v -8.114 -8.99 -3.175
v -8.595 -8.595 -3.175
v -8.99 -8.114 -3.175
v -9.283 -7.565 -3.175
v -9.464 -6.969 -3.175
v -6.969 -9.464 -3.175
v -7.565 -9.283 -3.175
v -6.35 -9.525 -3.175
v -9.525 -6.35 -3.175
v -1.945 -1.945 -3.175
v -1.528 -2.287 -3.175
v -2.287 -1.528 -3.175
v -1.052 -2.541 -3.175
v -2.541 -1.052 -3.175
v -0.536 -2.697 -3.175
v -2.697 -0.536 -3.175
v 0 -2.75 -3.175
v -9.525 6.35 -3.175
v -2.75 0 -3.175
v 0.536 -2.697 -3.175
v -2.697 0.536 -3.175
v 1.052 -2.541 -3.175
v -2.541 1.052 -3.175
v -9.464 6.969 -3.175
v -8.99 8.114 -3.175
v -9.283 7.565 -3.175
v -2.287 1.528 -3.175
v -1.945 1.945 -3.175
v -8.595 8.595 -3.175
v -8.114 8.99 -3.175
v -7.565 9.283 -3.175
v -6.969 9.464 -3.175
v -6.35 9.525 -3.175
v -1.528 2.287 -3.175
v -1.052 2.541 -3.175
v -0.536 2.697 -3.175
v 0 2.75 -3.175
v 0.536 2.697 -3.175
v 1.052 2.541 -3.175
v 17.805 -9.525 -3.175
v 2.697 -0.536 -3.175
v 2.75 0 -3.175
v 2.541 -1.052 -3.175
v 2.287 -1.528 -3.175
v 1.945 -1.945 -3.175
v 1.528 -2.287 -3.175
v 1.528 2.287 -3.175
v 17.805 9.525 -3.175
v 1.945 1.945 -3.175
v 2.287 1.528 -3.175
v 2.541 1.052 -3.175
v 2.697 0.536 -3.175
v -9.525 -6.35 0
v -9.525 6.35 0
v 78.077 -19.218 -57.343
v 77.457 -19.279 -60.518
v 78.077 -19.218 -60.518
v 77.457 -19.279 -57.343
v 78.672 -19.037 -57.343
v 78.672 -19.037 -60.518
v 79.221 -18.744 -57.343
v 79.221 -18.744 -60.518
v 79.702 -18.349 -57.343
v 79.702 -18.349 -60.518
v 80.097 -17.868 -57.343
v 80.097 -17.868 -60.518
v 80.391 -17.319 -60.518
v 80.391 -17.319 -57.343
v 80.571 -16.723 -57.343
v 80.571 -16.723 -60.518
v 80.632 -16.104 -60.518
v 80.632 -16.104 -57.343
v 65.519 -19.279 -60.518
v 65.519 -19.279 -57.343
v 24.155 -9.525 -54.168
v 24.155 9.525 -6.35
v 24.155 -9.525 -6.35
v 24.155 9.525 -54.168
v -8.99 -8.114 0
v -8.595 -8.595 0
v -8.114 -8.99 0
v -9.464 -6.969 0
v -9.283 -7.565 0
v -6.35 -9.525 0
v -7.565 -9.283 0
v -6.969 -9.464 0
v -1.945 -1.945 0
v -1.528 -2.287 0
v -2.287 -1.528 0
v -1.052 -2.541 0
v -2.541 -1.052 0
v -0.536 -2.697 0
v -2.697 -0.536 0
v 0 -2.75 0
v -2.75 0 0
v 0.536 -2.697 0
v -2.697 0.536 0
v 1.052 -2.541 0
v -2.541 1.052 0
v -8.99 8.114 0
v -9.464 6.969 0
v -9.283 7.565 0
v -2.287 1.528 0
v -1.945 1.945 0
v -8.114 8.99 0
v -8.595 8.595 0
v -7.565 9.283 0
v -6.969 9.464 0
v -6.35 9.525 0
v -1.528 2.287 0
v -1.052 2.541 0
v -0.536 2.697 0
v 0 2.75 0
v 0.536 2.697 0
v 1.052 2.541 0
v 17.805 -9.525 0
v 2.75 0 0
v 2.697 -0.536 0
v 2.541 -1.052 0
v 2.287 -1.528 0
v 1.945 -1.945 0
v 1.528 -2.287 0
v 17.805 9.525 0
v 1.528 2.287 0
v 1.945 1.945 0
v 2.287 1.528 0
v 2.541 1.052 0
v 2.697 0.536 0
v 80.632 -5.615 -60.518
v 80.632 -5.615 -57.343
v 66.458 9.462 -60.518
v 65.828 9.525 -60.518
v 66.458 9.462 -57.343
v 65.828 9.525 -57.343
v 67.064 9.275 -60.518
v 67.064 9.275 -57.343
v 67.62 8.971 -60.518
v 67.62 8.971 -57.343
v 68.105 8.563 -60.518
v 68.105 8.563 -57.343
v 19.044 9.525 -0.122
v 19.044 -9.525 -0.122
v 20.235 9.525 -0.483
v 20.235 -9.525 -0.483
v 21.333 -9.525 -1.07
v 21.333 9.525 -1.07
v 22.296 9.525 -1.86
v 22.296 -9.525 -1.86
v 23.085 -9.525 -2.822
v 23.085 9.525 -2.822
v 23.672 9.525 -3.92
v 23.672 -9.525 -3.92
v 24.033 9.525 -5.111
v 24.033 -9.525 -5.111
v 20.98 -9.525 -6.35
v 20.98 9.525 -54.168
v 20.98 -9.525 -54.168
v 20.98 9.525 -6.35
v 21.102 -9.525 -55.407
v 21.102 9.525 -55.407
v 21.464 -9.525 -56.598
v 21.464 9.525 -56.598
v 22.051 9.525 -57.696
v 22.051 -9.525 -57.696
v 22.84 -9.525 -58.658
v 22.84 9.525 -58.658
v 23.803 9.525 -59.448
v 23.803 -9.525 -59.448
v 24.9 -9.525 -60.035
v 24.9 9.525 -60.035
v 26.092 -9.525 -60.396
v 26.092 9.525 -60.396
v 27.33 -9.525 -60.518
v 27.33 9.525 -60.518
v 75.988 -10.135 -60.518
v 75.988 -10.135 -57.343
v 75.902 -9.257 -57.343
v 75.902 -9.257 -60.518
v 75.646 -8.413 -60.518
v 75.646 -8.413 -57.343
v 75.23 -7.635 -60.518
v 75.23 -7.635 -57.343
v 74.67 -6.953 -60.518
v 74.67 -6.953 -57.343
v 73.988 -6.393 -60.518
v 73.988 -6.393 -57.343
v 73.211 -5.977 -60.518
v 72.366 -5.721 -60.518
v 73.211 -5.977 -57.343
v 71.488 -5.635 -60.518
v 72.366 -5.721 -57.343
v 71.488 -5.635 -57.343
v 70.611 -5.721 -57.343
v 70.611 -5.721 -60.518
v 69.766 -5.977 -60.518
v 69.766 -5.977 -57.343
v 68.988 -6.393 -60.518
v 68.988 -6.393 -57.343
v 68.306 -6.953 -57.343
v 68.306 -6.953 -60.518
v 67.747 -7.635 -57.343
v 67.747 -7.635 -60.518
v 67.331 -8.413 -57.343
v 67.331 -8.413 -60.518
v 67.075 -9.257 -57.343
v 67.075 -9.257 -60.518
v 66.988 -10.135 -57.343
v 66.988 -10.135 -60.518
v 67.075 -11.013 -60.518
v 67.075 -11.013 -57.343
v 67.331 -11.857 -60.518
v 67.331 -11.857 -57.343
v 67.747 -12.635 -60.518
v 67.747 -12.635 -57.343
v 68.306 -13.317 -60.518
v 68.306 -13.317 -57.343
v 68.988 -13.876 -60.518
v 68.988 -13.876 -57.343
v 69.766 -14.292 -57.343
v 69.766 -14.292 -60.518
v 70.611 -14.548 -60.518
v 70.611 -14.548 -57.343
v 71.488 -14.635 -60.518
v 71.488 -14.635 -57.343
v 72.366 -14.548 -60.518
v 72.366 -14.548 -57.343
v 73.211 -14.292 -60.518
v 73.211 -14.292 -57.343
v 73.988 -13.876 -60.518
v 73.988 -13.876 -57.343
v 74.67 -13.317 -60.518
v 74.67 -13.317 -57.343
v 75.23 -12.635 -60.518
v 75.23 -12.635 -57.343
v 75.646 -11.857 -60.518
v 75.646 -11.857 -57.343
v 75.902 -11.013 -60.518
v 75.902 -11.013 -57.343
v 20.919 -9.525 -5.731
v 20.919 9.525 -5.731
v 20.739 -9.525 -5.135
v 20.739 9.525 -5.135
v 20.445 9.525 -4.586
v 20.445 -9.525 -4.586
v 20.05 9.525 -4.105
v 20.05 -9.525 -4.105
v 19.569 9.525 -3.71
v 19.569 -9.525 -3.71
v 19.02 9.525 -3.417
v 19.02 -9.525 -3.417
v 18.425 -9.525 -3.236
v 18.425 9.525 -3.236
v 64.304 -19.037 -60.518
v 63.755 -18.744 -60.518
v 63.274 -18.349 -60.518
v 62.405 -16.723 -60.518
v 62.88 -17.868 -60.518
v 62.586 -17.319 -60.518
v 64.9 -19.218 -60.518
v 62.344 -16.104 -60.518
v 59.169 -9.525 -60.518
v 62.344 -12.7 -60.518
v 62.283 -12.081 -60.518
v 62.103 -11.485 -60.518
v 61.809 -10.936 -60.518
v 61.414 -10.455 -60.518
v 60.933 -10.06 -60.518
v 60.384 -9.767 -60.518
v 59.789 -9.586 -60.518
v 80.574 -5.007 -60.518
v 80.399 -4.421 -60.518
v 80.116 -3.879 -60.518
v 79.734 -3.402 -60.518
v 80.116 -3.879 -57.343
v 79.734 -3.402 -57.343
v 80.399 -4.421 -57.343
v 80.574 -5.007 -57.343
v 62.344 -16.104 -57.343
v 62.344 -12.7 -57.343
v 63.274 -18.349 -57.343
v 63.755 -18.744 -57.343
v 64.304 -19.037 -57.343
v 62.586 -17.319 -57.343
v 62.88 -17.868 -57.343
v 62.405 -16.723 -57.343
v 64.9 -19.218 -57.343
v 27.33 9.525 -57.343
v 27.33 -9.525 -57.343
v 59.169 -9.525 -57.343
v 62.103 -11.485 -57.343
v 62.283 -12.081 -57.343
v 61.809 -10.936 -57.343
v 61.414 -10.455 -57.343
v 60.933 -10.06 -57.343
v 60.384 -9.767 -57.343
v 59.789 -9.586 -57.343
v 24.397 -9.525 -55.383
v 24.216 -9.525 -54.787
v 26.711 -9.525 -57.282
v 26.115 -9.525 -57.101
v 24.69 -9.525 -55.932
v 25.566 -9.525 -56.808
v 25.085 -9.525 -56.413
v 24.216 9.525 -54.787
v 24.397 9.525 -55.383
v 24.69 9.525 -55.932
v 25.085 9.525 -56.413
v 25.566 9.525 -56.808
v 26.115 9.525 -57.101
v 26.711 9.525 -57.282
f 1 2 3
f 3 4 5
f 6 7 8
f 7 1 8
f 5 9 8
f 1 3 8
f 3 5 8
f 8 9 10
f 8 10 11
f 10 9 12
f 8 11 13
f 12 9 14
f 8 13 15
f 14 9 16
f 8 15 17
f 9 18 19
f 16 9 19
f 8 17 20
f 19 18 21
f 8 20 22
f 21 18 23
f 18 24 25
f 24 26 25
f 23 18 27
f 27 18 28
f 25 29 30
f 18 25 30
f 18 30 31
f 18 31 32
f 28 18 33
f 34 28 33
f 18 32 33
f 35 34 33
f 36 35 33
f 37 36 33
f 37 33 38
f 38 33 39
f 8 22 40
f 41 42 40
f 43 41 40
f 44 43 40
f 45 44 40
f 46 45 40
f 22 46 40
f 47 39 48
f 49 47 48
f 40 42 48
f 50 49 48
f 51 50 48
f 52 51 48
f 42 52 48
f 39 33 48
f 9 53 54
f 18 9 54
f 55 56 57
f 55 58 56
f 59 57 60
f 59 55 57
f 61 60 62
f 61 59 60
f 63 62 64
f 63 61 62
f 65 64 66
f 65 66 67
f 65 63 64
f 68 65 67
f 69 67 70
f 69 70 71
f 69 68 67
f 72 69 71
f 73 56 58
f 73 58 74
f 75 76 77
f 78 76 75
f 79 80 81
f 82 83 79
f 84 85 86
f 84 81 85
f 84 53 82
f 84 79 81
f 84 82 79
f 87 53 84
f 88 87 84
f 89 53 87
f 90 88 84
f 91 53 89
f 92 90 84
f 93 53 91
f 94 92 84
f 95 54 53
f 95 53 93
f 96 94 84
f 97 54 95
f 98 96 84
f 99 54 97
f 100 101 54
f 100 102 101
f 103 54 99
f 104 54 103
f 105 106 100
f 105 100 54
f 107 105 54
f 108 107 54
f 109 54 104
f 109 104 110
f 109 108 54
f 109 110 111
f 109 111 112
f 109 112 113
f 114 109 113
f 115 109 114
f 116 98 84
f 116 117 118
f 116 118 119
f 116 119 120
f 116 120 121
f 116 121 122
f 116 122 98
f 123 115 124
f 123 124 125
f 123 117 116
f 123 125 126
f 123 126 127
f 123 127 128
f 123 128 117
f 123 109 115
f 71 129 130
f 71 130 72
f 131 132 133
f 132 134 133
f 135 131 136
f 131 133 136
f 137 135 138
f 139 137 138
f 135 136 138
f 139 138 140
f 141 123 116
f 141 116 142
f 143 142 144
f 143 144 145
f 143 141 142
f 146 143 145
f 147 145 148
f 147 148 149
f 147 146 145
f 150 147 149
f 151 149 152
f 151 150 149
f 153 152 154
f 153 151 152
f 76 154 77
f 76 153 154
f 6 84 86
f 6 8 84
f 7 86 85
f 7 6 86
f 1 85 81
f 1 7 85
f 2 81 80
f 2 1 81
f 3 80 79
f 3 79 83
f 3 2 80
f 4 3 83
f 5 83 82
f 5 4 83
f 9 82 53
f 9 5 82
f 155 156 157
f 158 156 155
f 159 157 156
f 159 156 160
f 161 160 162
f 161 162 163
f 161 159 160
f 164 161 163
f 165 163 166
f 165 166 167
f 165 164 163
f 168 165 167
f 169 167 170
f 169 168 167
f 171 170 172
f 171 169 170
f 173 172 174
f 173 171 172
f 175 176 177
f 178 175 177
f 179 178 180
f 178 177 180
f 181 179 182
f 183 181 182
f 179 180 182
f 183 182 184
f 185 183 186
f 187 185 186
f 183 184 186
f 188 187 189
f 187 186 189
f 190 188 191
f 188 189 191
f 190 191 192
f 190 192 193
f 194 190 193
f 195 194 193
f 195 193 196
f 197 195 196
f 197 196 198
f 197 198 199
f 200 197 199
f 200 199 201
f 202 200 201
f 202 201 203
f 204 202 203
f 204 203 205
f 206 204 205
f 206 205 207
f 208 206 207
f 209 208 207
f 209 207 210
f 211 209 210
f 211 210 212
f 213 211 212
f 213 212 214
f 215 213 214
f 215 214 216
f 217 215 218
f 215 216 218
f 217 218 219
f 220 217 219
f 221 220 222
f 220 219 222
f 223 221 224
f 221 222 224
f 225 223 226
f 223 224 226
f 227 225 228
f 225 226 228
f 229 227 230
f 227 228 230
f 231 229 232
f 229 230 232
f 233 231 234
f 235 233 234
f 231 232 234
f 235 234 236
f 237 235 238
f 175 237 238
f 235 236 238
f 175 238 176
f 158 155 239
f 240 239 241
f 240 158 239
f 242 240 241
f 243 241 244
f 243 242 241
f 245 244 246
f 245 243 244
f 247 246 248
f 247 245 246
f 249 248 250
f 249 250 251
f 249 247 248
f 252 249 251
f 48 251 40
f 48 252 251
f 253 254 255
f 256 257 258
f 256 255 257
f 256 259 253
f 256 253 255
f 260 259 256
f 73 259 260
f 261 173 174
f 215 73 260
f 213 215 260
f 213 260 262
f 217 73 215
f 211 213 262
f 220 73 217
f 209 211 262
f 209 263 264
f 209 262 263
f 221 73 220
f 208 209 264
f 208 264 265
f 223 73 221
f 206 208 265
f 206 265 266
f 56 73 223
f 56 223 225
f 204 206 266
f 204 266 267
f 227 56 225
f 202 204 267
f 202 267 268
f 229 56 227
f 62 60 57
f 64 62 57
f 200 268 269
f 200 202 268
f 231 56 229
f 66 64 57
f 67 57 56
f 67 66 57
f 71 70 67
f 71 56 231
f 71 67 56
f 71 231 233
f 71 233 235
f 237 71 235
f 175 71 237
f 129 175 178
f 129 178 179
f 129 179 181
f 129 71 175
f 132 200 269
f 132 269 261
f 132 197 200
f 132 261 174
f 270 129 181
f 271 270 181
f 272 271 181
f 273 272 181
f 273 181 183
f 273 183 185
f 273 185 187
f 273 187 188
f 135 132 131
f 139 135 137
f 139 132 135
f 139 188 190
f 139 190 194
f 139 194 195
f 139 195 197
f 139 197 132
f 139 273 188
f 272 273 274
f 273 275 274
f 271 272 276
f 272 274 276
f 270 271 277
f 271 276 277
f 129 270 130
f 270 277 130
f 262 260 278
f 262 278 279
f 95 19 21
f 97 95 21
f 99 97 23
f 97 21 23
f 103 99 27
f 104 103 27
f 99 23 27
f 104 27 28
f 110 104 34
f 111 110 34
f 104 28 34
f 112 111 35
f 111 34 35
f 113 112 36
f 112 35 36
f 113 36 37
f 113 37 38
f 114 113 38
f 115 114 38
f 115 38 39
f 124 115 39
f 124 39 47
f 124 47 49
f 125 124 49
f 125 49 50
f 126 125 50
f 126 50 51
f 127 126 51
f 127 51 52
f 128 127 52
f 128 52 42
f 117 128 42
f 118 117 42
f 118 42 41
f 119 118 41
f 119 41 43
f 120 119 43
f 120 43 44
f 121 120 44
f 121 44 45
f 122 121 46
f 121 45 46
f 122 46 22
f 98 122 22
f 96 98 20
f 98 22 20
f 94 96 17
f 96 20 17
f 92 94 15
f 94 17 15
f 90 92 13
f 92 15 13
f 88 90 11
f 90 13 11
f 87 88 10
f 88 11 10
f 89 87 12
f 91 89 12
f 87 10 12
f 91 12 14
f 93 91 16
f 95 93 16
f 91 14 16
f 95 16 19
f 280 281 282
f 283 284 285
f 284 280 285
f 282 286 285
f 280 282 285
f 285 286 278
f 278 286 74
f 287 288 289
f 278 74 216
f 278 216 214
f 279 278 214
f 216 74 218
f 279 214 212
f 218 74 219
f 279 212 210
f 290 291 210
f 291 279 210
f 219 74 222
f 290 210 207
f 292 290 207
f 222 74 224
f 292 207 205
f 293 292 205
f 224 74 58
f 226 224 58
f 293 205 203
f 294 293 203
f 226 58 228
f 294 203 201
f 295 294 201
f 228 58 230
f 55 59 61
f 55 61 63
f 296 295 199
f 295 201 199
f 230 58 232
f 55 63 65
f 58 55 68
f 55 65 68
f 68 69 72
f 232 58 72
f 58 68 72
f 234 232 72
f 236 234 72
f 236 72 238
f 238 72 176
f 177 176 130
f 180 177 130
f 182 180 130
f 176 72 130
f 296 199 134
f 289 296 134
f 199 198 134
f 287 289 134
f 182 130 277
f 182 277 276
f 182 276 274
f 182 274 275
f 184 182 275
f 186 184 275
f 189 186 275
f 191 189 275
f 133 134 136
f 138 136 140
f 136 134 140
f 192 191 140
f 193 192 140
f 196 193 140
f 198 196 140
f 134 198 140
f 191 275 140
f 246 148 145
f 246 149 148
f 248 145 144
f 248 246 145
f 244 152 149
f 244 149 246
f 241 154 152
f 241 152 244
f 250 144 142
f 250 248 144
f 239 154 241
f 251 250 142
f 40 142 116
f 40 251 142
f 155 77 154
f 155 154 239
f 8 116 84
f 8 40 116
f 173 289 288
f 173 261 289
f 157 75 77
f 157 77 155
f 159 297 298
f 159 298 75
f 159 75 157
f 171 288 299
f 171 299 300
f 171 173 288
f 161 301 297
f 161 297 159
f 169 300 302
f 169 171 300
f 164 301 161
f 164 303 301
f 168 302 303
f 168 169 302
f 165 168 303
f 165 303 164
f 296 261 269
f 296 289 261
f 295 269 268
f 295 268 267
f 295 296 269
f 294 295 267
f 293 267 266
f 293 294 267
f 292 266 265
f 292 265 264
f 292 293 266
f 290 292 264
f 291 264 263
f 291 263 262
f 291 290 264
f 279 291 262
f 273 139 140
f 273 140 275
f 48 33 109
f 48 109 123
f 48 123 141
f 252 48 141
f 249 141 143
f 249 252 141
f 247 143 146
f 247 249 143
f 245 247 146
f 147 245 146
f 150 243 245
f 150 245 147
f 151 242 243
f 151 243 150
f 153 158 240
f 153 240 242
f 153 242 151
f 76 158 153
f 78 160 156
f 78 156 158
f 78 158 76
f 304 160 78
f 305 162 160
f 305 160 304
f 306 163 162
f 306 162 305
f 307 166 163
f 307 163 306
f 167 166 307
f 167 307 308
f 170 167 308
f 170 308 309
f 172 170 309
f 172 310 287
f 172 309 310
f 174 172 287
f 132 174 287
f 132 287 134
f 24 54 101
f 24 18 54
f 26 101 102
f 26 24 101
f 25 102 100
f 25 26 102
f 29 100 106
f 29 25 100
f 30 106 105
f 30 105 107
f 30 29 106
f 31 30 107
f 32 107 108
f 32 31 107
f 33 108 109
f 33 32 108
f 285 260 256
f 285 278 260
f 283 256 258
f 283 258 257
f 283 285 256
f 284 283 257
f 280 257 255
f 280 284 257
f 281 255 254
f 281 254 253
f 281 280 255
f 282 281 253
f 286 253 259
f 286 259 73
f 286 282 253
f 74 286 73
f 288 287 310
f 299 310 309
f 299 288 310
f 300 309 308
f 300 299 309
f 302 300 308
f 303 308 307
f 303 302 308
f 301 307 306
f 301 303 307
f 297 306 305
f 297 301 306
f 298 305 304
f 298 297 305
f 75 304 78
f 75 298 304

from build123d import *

# Parameters (mm, degrees)
SKETCH2_W                    = 33.6804
SKETCH2_H                    = 19.05
SKETCH2_R                    = 1.189975692
BASE_FLANGE1_DEPTH           = 3.175
EDGE_FLANGE3_STRIP_W         = 19.05
EDGE_FLANGE3_STRIP_H         = 3.175
EDGE_FLANGE3_STRIP_CUT_DEPTH = 19.05
EDGE_FLANGE3_DEPTH           = 19.05
M5_CLEARANCE_HOLE1_D         = 5.5
EDGE_FLANGE5_STRIP_W         = 19.05
EDGE_FLANGE5_STRIP_H         = 3.175
EDGE_FLANGE5_STRIP_CUT_DEPTH = 19.05
EDGE_FLANGE5_DEPTH           = 19.05
EDGE_FLANGE5_START           = 3.175
EDGE_FLANGE5_PROFILE_R       = 1.708184841
EDGE_FLANGE5_FLAT_DEPTH      = 3.175
M8_CLEARANCE_HOLE1_D         = 9
FILLET2_R                    = 3.175


# Sheet-metal steps are written as plain solids
with BuildPart() as part:
    # Sketch2 → Base-Flange1 (new body)
    with BuildSketch(Plane.XY):
        with Locations((7.3152, 0)):
            Rectangle(SKETCH2_W, SKETCH2_H)
        Circle(SKETCH2_R, mode=Mode.SUBTRACT)
    extrude(amount=-BASE_FLANGE1_DEPTH)

    # Edge-Flange3 strip (across the edge) → Edge-Flange3 strip cut (cut)
    with BuildSketch(Plane(origin=(24.1554, 9.525, -3.175), x_dir=(-1, 0, 0), z_dir=(0, -1, 0))):
        with Locations((-3.175, -1.5875)):
            Rectangle(EDGE_FLANGE3_STRIP_W, EDGE_FLANGE3_STRIP_H)
    extrude(amount=EDGE_FLANGE3_STRIP_CUT_DEPTH, mode=Mode.SUBTRACT)

    # Edge-Flange3 section (across the edge) → Edge-Flange3 (add)
    with BuildSketch(Plane(origin=(24.1554, 9.525, -3.175), x_dir=(-1, 0, 0), z_dir=(0, -1, 0))):
        with BuildLine():
            Line((0, 3.175), (0, 54.16804))
            Line((0, 54.16804), (3.175, 54.16804))
            Line((3.175, 54.16804), (3.175, 3.175))
            ThreePointArc((3.175, 3.175), (4.10493597, 0.92993597), (6.35, 0))
            Line((6.35, 0), (6.35, -3.175))
            ThreePointArc((6.35, -3.175), (1.859871939, -1.315128061), (0, 3.175))
        make_face()
    extrude(amount=EDGE_FLANGE3_DEPTH)

    # M5 Clearance Hole1 (through all)
    with Locations(Plane.XY):
        with Locations((0, 0)):
            Hole(M5_CLEARANCE_HOLE1_D / 2)

    # Edge-Flange5 strip (across the edge) → Edge-Flange5 strip cut (cut)
    with BuildSketch(Plane(origin=(24.1554, -9.525, -57.34304), x_dir=(0, 0, 1), z_dir=(0, 1, 0))):
        with Locations((-6.35, -1.5875)):
            Rectangle(EDGE_FLANGE5_STRIP_W, EDGE_FLANGE5_STRIP_H)
    extrude(amount=EDGE_FLANGE5_STRIP_CUT_DEPTH, mode=Mode.SUBTRACT)

    # Edge-Flange5 bend section (across the edge) → Edge-Flange5 (add)
    with BuildSketch(Plane(origin=(24.1554, -9.525, -57.34304), x_dir=(0, 0, 1), z_dir=(0, 1, 0))):
        with BuildLine():
            Line((-3.175, 3.175), (0, 3.175))
            ThreePointArc((0, 3.175), (0.92993597, 0.92993597), (3.175, 0))
            Line((3.175, 0), (3.175, -3.175))
            ThreePointArc((3.175, -3.175), (-1.315128061, -1.315128061), (-3.175, 3.175))
        make_face()
    extrude(amount=EDGE_FLANGE5_DEPTH)

    # Edge-Flange5 profile (on flange) → Edge-Flange5 flat (add)
    with BuildSketch(Plane(origin=(24.1554, 0, -57.34304), x_dir=(0, 1, 0), z_dir=(0, 0, -1)).offset(EDGE_FLANGE5_START)):
        Polygon((-9.525, 3.175), (9.525, 3.175), (9.525, 43.014170651), (-4.326239915, 56.477027), (-19.2786, 56.477027), (-19.2786, 38.189027), (-9.525, 38.189027), align=None)
        with Locations((-10.1346, 47.333027)):
            Circle(EDGE_FLANGE5_PROFILE_R, mode=Mode.SUBTRACT)
    extrude(amount=-EDGE_FLANGE5_FLAT_DEPTH)

    # M8 Clearance Hole1 (through all)
    with Locations(Plane(origin=(0, 0, -60.51804), x_dir=(-1, 0, 0), z_dir=(0, 0, -1))):
        with Locations((-71.488427, -10.1346)):
            Hole(M8_CLEARANCE_HOLE1_D / 2)

    # Fillet2
    fillet2_edges = [part.edges().sort_by_distance(p)[0] for p in [
        (-9.525, 9.525, -1.5875),
        (62.344427, -9.525, -58.93054),
        (67.169570651, 9.525, -58.93054),
        (-9.525, -9.525, -1.5875),
        (80.632427, -4.326239915, -58.93054),
        (80.632427, -19.2786, -58.93054),
        (62.344427, -19.2786, -58.93054),
    ]]
    fillet(fillet2_edges, radius=FILLET2_R)


solid = part.part
